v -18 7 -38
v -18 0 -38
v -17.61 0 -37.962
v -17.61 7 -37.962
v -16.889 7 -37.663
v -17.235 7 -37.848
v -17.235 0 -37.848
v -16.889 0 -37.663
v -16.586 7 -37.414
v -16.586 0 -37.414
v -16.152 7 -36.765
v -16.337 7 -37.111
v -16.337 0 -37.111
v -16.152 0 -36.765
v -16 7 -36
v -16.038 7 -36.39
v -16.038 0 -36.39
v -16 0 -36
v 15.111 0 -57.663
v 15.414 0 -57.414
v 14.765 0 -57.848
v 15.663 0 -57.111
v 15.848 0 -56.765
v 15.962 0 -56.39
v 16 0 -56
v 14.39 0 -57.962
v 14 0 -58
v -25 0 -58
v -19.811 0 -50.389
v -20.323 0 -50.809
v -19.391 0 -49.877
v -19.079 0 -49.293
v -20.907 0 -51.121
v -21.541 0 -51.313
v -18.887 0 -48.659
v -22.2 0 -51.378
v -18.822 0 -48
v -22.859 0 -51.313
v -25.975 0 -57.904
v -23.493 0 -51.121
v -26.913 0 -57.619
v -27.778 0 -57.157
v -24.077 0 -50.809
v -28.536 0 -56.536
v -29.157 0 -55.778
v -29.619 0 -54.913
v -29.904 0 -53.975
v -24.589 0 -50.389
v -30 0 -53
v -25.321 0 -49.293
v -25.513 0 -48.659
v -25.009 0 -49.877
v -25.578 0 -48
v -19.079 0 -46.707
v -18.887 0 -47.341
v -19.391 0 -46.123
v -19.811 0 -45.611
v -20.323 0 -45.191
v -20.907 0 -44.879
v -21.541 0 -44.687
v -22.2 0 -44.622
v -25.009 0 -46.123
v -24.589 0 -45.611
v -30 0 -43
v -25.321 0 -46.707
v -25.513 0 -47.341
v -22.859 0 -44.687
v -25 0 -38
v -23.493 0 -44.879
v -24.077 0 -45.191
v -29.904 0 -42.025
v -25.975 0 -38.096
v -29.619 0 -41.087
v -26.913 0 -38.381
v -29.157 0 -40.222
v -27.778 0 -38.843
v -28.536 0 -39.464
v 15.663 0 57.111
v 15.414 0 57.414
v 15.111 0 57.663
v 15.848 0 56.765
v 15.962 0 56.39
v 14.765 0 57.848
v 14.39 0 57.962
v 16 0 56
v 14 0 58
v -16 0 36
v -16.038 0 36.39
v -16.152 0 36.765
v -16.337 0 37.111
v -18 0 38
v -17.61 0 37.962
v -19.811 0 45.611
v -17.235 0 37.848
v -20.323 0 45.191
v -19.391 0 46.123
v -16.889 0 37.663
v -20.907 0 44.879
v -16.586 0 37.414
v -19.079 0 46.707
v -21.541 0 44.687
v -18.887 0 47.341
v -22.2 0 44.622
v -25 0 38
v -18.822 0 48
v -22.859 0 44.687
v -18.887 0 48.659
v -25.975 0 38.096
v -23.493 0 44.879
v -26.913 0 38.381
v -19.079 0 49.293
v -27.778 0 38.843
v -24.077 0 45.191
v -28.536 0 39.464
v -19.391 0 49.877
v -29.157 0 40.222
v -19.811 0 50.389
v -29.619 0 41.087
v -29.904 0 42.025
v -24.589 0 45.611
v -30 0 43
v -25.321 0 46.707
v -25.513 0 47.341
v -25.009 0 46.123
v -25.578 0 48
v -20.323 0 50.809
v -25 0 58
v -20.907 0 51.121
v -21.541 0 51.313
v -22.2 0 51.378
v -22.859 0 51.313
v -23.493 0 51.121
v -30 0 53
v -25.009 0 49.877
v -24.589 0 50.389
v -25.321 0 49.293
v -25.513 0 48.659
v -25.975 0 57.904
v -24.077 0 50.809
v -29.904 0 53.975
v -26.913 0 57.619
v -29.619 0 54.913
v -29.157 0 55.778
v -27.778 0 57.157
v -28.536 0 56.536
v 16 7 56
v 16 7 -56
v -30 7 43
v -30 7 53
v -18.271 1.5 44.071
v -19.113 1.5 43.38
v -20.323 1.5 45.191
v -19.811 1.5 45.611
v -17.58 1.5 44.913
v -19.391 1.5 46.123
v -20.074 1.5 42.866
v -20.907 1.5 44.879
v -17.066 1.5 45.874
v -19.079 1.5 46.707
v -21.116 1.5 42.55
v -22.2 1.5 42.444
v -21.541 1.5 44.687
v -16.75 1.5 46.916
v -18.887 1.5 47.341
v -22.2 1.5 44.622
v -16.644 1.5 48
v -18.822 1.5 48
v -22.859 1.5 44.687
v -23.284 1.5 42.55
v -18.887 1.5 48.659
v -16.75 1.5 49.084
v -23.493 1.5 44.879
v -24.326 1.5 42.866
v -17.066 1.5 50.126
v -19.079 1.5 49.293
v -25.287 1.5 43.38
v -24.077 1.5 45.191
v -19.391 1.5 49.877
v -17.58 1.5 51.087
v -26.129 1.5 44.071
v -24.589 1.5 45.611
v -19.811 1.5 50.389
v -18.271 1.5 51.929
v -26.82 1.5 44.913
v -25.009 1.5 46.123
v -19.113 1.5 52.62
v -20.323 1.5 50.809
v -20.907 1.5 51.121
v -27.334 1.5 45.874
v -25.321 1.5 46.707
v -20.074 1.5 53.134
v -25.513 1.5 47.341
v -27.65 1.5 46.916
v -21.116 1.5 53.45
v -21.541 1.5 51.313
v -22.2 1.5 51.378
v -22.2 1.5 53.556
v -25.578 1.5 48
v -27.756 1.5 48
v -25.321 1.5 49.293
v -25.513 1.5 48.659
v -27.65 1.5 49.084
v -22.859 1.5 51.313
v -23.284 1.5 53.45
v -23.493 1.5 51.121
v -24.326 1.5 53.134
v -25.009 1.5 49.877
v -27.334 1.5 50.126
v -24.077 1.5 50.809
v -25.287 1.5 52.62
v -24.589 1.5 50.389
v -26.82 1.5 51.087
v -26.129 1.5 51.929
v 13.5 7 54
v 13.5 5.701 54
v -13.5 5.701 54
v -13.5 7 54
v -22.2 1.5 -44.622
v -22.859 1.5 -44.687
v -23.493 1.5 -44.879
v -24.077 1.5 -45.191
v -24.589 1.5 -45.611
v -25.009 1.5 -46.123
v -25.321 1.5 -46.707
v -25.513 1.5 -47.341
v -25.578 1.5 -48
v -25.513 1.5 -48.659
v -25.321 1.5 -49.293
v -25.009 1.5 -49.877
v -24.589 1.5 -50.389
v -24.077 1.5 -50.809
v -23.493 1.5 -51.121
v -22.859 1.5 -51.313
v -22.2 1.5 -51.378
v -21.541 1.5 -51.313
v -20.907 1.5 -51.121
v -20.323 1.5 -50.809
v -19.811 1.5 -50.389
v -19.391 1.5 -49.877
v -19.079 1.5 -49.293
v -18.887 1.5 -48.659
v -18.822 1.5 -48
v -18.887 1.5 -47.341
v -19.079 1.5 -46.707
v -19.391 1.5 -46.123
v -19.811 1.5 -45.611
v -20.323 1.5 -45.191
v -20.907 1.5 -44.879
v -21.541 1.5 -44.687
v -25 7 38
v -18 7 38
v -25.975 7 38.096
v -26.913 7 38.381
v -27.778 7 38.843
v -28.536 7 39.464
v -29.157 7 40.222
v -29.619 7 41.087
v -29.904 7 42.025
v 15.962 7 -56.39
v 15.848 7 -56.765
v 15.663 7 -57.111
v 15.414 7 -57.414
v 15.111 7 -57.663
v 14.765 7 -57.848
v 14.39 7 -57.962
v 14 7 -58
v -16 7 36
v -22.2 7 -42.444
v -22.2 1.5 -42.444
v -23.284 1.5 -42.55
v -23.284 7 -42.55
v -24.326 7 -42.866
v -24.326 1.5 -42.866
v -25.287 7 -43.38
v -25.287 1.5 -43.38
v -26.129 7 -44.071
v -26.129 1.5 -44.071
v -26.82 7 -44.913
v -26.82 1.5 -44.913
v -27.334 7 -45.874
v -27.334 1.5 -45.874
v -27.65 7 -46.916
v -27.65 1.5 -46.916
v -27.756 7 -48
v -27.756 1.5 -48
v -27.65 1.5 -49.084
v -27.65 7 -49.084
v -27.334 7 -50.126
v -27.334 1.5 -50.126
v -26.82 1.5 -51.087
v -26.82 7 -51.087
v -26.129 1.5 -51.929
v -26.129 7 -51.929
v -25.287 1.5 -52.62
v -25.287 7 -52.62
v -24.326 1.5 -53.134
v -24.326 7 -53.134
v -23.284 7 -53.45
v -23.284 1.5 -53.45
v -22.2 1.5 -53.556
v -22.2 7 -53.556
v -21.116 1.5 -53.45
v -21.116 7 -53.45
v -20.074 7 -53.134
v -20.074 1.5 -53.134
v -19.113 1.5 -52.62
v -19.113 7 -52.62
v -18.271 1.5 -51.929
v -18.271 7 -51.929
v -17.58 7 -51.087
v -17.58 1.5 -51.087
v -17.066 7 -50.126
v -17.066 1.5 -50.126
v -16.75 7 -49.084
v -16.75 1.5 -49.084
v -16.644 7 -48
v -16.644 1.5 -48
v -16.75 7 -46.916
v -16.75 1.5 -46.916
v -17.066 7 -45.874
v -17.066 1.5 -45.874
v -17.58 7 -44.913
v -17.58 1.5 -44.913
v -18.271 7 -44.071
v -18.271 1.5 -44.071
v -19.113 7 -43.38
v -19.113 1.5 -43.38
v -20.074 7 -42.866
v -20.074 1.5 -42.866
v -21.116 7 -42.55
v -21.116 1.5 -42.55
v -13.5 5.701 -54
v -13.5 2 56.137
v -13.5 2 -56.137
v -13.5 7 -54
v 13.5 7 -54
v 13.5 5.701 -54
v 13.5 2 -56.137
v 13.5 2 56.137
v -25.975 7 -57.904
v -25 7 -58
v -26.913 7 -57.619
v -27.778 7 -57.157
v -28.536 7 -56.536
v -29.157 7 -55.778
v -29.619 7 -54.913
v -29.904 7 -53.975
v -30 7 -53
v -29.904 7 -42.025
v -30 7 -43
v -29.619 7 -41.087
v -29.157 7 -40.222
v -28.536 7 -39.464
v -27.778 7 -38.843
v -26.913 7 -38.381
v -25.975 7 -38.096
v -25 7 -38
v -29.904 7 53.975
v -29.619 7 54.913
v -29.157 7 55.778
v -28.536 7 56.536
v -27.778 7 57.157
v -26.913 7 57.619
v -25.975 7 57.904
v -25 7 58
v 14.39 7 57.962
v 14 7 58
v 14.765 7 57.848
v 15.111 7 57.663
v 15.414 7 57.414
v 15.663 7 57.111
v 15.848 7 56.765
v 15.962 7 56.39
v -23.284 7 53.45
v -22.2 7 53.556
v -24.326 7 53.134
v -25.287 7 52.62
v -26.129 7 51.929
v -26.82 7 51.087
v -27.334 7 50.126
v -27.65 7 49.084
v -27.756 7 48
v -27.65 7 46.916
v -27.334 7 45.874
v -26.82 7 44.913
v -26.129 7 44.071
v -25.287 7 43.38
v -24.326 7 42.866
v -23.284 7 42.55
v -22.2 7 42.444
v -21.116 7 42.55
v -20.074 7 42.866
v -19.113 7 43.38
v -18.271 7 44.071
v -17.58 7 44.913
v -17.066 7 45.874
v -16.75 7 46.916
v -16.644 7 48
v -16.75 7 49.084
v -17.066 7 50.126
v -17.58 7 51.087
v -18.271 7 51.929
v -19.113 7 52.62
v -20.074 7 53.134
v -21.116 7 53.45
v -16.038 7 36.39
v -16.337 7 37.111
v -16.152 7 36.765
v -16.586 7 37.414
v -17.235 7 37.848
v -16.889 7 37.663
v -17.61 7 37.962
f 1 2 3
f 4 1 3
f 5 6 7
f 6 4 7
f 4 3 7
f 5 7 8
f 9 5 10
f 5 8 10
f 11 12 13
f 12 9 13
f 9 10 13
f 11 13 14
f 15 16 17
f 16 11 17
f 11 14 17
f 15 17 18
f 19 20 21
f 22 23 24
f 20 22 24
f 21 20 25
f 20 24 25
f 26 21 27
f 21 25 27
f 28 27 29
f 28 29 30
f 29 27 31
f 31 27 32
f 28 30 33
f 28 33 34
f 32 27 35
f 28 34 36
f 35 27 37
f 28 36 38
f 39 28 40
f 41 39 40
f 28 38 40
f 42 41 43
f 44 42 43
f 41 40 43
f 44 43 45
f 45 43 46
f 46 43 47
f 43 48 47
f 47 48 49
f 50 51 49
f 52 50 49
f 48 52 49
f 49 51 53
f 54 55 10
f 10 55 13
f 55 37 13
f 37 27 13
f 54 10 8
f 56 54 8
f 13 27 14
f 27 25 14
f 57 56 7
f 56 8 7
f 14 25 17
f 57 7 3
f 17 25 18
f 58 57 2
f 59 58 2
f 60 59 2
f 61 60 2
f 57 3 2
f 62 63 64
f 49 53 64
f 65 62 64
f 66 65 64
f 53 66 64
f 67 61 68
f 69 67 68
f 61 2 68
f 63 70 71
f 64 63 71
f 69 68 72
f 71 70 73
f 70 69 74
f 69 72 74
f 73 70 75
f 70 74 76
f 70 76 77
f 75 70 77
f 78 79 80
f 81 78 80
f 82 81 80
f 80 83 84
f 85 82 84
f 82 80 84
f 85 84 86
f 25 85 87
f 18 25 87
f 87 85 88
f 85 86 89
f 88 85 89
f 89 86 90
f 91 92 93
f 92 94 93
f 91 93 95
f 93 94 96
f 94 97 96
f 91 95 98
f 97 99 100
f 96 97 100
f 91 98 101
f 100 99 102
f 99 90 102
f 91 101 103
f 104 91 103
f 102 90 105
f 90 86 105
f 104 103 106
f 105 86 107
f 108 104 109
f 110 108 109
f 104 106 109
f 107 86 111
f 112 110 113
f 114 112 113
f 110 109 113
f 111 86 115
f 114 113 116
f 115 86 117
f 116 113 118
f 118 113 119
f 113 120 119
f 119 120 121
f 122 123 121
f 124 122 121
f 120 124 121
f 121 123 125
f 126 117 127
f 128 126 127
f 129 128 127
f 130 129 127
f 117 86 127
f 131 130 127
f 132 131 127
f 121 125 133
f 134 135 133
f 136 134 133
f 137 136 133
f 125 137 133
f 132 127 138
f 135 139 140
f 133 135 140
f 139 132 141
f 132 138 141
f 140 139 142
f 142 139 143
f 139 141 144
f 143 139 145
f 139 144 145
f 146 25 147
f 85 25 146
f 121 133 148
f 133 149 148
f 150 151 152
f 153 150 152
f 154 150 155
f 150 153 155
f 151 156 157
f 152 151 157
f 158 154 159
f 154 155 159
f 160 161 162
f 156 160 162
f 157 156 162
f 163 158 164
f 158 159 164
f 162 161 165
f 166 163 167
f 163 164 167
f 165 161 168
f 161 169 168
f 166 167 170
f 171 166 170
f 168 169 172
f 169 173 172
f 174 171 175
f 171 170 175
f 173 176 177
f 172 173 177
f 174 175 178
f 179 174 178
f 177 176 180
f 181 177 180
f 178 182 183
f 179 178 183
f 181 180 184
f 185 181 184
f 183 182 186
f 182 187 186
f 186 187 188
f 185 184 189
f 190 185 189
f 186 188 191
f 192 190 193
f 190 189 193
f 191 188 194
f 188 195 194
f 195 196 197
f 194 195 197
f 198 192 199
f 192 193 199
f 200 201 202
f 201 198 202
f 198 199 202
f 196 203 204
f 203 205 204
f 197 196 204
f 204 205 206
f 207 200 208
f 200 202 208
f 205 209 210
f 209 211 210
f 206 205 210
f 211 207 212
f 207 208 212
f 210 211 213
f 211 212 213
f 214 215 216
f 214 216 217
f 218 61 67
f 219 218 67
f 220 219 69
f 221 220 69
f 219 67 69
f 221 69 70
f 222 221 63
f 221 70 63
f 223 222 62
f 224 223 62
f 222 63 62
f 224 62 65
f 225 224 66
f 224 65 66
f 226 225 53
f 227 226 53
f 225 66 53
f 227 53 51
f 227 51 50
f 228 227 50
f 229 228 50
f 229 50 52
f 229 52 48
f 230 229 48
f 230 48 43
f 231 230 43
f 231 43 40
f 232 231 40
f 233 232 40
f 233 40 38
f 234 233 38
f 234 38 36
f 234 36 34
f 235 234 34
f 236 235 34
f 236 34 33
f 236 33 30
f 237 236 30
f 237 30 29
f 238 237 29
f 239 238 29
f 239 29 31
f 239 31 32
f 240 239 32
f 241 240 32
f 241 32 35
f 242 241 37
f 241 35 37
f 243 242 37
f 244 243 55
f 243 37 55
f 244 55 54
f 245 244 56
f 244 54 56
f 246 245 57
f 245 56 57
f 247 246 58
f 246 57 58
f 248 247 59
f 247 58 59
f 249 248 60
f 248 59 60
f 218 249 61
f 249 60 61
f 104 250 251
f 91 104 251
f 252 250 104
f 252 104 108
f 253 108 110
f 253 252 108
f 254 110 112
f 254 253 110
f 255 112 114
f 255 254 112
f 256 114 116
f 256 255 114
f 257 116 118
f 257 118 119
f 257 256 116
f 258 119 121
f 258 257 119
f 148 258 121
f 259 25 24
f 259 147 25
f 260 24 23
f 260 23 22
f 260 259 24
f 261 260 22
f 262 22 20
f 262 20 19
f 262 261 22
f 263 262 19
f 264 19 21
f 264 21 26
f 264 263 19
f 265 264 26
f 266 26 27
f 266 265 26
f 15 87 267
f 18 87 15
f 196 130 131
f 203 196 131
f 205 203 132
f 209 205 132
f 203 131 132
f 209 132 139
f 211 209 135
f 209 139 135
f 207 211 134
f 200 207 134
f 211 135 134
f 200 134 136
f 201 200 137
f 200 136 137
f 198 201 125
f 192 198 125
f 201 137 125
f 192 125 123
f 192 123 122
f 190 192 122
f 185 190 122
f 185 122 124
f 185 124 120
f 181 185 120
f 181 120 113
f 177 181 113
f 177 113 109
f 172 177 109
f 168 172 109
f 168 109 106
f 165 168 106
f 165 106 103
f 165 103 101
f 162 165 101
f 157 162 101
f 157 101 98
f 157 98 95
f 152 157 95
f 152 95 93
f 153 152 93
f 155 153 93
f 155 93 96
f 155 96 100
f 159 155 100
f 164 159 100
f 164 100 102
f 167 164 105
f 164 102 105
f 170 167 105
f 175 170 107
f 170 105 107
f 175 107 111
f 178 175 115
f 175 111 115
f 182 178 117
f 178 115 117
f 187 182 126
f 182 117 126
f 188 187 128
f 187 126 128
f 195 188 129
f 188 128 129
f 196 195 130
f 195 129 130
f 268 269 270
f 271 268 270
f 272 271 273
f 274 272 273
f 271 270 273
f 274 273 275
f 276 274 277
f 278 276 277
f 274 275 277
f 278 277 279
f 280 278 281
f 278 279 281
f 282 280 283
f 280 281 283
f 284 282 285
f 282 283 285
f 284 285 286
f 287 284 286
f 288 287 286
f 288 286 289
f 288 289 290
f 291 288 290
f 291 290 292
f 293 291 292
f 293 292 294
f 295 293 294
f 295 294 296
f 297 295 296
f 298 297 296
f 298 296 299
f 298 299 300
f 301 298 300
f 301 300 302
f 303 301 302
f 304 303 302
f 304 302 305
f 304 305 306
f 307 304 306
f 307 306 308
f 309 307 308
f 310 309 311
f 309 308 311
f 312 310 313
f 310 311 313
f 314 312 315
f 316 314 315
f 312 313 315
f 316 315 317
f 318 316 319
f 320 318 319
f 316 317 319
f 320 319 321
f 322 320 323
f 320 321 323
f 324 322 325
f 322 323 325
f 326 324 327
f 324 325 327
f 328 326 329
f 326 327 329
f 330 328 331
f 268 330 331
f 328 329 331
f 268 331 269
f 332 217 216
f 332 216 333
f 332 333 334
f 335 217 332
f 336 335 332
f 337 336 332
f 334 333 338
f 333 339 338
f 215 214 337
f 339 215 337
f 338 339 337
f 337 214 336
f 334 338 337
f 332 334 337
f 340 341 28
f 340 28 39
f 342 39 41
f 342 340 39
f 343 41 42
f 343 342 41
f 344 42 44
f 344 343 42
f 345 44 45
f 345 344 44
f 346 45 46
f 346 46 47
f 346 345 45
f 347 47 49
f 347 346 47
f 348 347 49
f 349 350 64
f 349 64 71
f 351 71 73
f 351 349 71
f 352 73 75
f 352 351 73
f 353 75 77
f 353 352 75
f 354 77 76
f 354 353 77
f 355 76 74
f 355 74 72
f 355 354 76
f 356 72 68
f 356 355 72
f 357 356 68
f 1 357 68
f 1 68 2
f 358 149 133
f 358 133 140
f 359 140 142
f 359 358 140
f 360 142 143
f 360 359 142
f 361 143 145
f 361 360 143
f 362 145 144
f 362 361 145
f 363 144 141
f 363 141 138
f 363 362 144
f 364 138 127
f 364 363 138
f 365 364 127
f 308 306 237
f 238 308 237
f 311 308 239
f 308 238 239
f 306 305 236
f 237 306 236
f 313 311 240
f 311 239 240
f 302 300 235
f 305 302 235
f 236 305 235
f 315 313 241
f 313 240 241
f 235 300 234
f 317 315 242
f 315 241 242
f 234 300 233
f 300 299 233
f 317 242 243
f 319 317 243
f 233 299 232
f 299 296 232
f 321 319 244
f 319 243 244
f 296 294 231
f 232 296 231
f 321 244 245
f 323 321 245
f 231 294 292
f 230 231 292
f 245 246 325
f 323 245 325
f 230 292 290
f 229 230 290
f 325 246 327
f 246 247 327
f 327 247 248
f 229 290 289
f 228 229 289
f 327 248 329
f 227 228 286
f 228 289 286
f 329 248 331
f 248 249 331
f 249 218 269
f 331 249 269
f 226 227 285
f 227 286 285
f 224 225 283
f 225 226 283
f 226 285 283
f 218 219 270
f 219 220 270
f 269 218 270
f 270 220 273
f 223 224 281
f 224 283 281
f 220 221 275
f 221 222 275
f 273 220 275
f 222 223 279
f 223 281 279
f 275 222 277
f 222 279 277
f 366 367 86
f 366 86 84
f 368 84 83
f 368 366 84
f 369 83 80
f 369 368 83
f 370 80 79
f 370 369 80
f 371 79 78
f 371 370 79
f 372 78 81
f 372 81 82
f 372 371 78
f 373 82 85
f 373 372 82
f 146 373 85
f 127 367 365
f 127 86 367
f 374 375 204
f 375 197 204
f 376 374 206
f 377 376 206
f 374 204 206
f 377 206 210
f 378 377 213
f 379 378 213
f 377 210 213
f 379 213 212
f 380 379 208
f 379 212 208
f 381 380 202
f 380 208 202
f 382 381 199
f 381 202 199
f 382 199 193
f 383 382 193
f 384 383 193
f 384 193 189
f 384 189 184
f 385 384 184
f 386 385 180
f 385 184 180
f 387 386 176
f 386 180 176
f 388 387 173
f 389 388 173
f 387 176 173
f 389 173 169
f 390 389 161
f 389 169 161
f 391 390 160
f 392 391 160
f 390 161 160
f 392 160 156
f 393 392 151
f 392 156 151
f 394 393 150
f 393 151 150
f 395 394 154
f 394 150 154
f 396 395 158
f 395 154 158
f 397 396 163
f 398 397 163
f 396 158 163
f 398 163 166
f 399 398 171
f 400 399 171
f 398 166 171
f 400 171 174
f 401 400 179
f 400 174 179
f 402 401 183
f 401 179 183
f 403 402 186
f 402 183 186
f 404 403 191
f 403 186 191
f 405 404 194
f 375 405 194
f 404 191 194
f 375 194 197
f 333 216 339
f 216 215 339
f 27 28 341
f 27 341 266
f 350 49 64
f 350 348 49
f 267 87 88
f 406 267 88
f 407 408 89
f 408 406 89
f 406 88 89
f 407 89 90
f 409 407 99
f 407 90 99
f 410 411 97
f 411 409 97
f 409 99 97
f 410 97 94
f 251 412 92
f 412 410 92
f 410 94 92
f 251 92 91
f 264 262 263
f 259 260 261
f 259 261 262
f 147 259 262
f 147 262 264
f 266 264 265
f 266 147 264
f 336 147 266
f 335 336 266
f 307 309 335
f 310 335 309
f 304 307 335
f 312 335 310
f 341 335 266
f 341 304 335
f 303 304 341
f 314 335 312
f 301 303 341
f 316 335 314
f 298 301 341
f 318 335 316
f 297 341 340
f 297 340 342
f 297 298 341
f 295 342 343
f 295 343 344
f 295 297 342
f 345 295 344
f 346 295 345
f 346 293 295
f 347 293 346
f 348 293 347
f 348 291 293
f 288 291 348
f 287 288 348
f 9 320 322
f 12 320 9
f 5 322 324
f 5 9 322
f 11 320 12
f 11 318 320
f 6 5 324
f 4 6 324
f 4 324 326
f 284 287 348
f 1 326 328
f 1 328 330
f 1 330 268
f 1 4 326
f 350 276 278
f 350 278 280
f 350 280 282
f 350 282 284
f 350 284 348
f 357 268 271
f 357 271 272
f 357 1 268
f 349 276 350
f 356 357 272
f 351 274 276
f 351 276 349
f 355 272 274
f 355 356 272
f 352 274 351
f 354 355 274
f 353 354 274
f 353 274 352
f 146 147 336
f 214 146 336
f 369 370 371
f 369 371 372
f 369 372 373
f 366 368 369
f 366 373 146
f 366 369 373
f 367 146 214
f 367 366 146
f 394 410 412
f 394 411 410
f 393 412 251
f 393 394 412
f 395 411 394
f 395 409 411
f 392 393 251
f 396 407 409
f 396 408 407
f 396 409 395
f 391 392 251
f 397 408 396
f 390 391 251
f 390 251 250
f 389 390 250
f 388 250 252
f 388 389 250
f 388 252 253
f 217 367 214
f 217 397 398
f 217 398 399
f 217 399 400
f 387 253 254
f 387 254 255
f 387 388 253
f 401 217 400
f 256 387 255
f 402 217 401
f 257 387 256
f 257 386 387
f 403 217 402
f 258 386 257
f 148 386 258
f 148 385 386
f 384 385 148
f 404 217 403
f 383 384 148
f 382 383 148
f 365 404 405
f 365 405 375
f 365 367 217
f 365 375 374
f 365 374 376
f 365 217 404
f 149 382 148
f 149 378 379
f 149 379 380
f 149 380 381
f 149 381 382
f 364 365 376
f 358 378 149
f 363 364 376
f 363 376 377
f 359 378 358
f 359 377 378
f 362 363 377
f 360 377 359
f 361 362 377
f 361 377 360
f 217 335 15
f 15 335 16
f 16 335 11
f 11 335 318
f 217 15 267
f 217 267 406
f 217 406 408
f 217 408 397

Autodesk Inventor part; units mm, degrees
ref_plane "YZ Plane" through (0, 0, 0) normal (1, 0, 0) x (0, 1, 0)
ref_plane "XZ Plane" through (0, 0, 0) normal (0, 1, 0) x (-1, 0, 0)
ref_plane "XY Plane" through (0, 0, 0) normal (0, 0, 1) x (1, 0, 0)
sketch "Sketch1" plane through (0, 0, 0) normal (0, 1, 0) x (-1, 0, 0)
  line L0 (-16, 58) -> (16, 58)
  line L1 (16, 58) -> (16, -58)
  line L2 (16, -58) -> (-16, -58)
  line L3 (-16, -58) -> (-16, 58)
  line L4 (-16, 58) -> (16, -58) construction
  line L5 (16, 58) -> (-16, -58) construction
  point P0 (0, 0)
  dimension "d0" = 32
  dimension "d1" = 116
extrude "Extrusion1" add sketch "Sketch1" along normal blind 7
sketch "Sketch3" plane through (16, 0, 58) normal (1, 0, 0) x (0, 0, -1)
  line L0 (0, 7) -> (116, 7) projected
  line L1 (4.75, 7) -> (1.8632, 2)
  line L2 (1.8632, 2) -> (114.1368, 2)
  line L3 (114.1368, 2) -> (111.25, 7)
  line L4 (0, 0) -> (0, 7) projected
  line L5 (116, 0) -> (116, 7) projected
  line L6 (4, 5.701) -> (4, 7)
  line L7 (116, 7) -> (0, 7) projected
  line L8 (112, 7) -> (112, 5.701)
  point P0 (58, 0)
  dimension "d4" = 60
  dimension "d6" = 60
  dimension "d7" = 5
  dimension "d8" = 106.5
  dimension "d9" = 116
  dimension "d10" = 4.75
  dimension "d17" = 4
  dimension "d18" = 4
extrude "Extrusion2" cut sketch "Sketch3" against normal through all
sketch "Sketch4" plane through (0, 7, 0) normal (0, 1, 0) x (1, 0, 0)
  line L0 (-16, 58) -> (-16, -58) projected
  line L1 (-16, -58) -> (-13.5, -58)
  line L2 (-13.5, -58) -> (-13.5, 58)
  line L3 (-13.5, 58) -> (-16, 58)
  line L4 (-16, 58) -> (-16, -58)
  line L5 (16, -58) -> (16, 58) projected
  line L6 (16, -58) -> (13.5, -58)
  line L7 (13.5, -58) -> (13.5, 58)
  line L8 (13.5, 58) -> (16, 58)
  line L9 (16, 58) -> (16, -58)
  line L10 (16, 58) -> (-16, 58) projected
  point P0 (0, 0)
  dimension "d13" = 2.5
  dimension "d14" = 2.5
extrude "Extrusion3" add sketch "Sketch4" against normal up to surface (7 mm away)
sketch "Sketch5" plane through (0, 7, 0) normal (0, 1, 0) x (1, 0, 0)
  line L0 (-16, 58) -> (-16, -58) projected
  line L1 (-16, -58) -> (-25, -58)
  line L2 (-30, -53) -> (-30, -43)
  line L3 (-25, -38) -> (-16, -38)
  line L4 (-16, -38) -> (-16, -58)
  arc A0 (-30, -53) -> (-25, -58) centre (-25, -53) ccw
  arc A1 (-25, -38) -> (-30, -43) centre (-25, -43) ccw
  line L5 (-36.8459, 0) -> (21.1314, 0)
  line L6 (-16, 58) -> (-25, 58)
  line L7 (-30, 53) -> (-30, 43)
  line L8 (-25, 38) -> (-16, 38)
  line L9 (-16, 38) -> (-16, 58)
  arc A2 (-25, 58) -> (-30, 53) centre (-25, 53) ccw
  arc A3 (-30, 43) -> (-25, 38) centre (-25, 43) ccw
  point P0 (0, 0)
  point P1 (-30, -38)
  point P2 (-30, -58)
  point P3 (-22.2, -48)
  point P4 (-30, 38)
  point P5 (-30, 58)
  point P6 (-22.2, 48)
  dimension "d19" = 20
  dimension "d20" = 14
  dimension "d21" = 22.2
  dimension "d22" = 10
  dimension "d23" = 6.2
  dimension "d33" = 5
extrude "Extrusion4" add sketch "Sketch5" against normal up to surface (7 mm away)
hole "Hole1" at (-22.2, 7, 48) at (-22.2, 7, -48) direction (0, -1, 0) diameter 6.756 depth 19.05 tip angle 118 counterbore diameter 11.113 counterbore depth 5.5 clearance for "Socket Head Cap Screw" size "1/4" standard "Ansi Unified Screw Threads"
fillet "Fillet1" radius 2 4 edges at (16, 3.5, -58) (16, 3.5, 58) (-16, 3.5, 38) (-16, 3.5, -38)
equation "\"d10\" = -0.5 * d8 + 0.5 * d9"
equation "\"d22\" = 0.5 * d19"
properties part number "Bracket Clamp"
